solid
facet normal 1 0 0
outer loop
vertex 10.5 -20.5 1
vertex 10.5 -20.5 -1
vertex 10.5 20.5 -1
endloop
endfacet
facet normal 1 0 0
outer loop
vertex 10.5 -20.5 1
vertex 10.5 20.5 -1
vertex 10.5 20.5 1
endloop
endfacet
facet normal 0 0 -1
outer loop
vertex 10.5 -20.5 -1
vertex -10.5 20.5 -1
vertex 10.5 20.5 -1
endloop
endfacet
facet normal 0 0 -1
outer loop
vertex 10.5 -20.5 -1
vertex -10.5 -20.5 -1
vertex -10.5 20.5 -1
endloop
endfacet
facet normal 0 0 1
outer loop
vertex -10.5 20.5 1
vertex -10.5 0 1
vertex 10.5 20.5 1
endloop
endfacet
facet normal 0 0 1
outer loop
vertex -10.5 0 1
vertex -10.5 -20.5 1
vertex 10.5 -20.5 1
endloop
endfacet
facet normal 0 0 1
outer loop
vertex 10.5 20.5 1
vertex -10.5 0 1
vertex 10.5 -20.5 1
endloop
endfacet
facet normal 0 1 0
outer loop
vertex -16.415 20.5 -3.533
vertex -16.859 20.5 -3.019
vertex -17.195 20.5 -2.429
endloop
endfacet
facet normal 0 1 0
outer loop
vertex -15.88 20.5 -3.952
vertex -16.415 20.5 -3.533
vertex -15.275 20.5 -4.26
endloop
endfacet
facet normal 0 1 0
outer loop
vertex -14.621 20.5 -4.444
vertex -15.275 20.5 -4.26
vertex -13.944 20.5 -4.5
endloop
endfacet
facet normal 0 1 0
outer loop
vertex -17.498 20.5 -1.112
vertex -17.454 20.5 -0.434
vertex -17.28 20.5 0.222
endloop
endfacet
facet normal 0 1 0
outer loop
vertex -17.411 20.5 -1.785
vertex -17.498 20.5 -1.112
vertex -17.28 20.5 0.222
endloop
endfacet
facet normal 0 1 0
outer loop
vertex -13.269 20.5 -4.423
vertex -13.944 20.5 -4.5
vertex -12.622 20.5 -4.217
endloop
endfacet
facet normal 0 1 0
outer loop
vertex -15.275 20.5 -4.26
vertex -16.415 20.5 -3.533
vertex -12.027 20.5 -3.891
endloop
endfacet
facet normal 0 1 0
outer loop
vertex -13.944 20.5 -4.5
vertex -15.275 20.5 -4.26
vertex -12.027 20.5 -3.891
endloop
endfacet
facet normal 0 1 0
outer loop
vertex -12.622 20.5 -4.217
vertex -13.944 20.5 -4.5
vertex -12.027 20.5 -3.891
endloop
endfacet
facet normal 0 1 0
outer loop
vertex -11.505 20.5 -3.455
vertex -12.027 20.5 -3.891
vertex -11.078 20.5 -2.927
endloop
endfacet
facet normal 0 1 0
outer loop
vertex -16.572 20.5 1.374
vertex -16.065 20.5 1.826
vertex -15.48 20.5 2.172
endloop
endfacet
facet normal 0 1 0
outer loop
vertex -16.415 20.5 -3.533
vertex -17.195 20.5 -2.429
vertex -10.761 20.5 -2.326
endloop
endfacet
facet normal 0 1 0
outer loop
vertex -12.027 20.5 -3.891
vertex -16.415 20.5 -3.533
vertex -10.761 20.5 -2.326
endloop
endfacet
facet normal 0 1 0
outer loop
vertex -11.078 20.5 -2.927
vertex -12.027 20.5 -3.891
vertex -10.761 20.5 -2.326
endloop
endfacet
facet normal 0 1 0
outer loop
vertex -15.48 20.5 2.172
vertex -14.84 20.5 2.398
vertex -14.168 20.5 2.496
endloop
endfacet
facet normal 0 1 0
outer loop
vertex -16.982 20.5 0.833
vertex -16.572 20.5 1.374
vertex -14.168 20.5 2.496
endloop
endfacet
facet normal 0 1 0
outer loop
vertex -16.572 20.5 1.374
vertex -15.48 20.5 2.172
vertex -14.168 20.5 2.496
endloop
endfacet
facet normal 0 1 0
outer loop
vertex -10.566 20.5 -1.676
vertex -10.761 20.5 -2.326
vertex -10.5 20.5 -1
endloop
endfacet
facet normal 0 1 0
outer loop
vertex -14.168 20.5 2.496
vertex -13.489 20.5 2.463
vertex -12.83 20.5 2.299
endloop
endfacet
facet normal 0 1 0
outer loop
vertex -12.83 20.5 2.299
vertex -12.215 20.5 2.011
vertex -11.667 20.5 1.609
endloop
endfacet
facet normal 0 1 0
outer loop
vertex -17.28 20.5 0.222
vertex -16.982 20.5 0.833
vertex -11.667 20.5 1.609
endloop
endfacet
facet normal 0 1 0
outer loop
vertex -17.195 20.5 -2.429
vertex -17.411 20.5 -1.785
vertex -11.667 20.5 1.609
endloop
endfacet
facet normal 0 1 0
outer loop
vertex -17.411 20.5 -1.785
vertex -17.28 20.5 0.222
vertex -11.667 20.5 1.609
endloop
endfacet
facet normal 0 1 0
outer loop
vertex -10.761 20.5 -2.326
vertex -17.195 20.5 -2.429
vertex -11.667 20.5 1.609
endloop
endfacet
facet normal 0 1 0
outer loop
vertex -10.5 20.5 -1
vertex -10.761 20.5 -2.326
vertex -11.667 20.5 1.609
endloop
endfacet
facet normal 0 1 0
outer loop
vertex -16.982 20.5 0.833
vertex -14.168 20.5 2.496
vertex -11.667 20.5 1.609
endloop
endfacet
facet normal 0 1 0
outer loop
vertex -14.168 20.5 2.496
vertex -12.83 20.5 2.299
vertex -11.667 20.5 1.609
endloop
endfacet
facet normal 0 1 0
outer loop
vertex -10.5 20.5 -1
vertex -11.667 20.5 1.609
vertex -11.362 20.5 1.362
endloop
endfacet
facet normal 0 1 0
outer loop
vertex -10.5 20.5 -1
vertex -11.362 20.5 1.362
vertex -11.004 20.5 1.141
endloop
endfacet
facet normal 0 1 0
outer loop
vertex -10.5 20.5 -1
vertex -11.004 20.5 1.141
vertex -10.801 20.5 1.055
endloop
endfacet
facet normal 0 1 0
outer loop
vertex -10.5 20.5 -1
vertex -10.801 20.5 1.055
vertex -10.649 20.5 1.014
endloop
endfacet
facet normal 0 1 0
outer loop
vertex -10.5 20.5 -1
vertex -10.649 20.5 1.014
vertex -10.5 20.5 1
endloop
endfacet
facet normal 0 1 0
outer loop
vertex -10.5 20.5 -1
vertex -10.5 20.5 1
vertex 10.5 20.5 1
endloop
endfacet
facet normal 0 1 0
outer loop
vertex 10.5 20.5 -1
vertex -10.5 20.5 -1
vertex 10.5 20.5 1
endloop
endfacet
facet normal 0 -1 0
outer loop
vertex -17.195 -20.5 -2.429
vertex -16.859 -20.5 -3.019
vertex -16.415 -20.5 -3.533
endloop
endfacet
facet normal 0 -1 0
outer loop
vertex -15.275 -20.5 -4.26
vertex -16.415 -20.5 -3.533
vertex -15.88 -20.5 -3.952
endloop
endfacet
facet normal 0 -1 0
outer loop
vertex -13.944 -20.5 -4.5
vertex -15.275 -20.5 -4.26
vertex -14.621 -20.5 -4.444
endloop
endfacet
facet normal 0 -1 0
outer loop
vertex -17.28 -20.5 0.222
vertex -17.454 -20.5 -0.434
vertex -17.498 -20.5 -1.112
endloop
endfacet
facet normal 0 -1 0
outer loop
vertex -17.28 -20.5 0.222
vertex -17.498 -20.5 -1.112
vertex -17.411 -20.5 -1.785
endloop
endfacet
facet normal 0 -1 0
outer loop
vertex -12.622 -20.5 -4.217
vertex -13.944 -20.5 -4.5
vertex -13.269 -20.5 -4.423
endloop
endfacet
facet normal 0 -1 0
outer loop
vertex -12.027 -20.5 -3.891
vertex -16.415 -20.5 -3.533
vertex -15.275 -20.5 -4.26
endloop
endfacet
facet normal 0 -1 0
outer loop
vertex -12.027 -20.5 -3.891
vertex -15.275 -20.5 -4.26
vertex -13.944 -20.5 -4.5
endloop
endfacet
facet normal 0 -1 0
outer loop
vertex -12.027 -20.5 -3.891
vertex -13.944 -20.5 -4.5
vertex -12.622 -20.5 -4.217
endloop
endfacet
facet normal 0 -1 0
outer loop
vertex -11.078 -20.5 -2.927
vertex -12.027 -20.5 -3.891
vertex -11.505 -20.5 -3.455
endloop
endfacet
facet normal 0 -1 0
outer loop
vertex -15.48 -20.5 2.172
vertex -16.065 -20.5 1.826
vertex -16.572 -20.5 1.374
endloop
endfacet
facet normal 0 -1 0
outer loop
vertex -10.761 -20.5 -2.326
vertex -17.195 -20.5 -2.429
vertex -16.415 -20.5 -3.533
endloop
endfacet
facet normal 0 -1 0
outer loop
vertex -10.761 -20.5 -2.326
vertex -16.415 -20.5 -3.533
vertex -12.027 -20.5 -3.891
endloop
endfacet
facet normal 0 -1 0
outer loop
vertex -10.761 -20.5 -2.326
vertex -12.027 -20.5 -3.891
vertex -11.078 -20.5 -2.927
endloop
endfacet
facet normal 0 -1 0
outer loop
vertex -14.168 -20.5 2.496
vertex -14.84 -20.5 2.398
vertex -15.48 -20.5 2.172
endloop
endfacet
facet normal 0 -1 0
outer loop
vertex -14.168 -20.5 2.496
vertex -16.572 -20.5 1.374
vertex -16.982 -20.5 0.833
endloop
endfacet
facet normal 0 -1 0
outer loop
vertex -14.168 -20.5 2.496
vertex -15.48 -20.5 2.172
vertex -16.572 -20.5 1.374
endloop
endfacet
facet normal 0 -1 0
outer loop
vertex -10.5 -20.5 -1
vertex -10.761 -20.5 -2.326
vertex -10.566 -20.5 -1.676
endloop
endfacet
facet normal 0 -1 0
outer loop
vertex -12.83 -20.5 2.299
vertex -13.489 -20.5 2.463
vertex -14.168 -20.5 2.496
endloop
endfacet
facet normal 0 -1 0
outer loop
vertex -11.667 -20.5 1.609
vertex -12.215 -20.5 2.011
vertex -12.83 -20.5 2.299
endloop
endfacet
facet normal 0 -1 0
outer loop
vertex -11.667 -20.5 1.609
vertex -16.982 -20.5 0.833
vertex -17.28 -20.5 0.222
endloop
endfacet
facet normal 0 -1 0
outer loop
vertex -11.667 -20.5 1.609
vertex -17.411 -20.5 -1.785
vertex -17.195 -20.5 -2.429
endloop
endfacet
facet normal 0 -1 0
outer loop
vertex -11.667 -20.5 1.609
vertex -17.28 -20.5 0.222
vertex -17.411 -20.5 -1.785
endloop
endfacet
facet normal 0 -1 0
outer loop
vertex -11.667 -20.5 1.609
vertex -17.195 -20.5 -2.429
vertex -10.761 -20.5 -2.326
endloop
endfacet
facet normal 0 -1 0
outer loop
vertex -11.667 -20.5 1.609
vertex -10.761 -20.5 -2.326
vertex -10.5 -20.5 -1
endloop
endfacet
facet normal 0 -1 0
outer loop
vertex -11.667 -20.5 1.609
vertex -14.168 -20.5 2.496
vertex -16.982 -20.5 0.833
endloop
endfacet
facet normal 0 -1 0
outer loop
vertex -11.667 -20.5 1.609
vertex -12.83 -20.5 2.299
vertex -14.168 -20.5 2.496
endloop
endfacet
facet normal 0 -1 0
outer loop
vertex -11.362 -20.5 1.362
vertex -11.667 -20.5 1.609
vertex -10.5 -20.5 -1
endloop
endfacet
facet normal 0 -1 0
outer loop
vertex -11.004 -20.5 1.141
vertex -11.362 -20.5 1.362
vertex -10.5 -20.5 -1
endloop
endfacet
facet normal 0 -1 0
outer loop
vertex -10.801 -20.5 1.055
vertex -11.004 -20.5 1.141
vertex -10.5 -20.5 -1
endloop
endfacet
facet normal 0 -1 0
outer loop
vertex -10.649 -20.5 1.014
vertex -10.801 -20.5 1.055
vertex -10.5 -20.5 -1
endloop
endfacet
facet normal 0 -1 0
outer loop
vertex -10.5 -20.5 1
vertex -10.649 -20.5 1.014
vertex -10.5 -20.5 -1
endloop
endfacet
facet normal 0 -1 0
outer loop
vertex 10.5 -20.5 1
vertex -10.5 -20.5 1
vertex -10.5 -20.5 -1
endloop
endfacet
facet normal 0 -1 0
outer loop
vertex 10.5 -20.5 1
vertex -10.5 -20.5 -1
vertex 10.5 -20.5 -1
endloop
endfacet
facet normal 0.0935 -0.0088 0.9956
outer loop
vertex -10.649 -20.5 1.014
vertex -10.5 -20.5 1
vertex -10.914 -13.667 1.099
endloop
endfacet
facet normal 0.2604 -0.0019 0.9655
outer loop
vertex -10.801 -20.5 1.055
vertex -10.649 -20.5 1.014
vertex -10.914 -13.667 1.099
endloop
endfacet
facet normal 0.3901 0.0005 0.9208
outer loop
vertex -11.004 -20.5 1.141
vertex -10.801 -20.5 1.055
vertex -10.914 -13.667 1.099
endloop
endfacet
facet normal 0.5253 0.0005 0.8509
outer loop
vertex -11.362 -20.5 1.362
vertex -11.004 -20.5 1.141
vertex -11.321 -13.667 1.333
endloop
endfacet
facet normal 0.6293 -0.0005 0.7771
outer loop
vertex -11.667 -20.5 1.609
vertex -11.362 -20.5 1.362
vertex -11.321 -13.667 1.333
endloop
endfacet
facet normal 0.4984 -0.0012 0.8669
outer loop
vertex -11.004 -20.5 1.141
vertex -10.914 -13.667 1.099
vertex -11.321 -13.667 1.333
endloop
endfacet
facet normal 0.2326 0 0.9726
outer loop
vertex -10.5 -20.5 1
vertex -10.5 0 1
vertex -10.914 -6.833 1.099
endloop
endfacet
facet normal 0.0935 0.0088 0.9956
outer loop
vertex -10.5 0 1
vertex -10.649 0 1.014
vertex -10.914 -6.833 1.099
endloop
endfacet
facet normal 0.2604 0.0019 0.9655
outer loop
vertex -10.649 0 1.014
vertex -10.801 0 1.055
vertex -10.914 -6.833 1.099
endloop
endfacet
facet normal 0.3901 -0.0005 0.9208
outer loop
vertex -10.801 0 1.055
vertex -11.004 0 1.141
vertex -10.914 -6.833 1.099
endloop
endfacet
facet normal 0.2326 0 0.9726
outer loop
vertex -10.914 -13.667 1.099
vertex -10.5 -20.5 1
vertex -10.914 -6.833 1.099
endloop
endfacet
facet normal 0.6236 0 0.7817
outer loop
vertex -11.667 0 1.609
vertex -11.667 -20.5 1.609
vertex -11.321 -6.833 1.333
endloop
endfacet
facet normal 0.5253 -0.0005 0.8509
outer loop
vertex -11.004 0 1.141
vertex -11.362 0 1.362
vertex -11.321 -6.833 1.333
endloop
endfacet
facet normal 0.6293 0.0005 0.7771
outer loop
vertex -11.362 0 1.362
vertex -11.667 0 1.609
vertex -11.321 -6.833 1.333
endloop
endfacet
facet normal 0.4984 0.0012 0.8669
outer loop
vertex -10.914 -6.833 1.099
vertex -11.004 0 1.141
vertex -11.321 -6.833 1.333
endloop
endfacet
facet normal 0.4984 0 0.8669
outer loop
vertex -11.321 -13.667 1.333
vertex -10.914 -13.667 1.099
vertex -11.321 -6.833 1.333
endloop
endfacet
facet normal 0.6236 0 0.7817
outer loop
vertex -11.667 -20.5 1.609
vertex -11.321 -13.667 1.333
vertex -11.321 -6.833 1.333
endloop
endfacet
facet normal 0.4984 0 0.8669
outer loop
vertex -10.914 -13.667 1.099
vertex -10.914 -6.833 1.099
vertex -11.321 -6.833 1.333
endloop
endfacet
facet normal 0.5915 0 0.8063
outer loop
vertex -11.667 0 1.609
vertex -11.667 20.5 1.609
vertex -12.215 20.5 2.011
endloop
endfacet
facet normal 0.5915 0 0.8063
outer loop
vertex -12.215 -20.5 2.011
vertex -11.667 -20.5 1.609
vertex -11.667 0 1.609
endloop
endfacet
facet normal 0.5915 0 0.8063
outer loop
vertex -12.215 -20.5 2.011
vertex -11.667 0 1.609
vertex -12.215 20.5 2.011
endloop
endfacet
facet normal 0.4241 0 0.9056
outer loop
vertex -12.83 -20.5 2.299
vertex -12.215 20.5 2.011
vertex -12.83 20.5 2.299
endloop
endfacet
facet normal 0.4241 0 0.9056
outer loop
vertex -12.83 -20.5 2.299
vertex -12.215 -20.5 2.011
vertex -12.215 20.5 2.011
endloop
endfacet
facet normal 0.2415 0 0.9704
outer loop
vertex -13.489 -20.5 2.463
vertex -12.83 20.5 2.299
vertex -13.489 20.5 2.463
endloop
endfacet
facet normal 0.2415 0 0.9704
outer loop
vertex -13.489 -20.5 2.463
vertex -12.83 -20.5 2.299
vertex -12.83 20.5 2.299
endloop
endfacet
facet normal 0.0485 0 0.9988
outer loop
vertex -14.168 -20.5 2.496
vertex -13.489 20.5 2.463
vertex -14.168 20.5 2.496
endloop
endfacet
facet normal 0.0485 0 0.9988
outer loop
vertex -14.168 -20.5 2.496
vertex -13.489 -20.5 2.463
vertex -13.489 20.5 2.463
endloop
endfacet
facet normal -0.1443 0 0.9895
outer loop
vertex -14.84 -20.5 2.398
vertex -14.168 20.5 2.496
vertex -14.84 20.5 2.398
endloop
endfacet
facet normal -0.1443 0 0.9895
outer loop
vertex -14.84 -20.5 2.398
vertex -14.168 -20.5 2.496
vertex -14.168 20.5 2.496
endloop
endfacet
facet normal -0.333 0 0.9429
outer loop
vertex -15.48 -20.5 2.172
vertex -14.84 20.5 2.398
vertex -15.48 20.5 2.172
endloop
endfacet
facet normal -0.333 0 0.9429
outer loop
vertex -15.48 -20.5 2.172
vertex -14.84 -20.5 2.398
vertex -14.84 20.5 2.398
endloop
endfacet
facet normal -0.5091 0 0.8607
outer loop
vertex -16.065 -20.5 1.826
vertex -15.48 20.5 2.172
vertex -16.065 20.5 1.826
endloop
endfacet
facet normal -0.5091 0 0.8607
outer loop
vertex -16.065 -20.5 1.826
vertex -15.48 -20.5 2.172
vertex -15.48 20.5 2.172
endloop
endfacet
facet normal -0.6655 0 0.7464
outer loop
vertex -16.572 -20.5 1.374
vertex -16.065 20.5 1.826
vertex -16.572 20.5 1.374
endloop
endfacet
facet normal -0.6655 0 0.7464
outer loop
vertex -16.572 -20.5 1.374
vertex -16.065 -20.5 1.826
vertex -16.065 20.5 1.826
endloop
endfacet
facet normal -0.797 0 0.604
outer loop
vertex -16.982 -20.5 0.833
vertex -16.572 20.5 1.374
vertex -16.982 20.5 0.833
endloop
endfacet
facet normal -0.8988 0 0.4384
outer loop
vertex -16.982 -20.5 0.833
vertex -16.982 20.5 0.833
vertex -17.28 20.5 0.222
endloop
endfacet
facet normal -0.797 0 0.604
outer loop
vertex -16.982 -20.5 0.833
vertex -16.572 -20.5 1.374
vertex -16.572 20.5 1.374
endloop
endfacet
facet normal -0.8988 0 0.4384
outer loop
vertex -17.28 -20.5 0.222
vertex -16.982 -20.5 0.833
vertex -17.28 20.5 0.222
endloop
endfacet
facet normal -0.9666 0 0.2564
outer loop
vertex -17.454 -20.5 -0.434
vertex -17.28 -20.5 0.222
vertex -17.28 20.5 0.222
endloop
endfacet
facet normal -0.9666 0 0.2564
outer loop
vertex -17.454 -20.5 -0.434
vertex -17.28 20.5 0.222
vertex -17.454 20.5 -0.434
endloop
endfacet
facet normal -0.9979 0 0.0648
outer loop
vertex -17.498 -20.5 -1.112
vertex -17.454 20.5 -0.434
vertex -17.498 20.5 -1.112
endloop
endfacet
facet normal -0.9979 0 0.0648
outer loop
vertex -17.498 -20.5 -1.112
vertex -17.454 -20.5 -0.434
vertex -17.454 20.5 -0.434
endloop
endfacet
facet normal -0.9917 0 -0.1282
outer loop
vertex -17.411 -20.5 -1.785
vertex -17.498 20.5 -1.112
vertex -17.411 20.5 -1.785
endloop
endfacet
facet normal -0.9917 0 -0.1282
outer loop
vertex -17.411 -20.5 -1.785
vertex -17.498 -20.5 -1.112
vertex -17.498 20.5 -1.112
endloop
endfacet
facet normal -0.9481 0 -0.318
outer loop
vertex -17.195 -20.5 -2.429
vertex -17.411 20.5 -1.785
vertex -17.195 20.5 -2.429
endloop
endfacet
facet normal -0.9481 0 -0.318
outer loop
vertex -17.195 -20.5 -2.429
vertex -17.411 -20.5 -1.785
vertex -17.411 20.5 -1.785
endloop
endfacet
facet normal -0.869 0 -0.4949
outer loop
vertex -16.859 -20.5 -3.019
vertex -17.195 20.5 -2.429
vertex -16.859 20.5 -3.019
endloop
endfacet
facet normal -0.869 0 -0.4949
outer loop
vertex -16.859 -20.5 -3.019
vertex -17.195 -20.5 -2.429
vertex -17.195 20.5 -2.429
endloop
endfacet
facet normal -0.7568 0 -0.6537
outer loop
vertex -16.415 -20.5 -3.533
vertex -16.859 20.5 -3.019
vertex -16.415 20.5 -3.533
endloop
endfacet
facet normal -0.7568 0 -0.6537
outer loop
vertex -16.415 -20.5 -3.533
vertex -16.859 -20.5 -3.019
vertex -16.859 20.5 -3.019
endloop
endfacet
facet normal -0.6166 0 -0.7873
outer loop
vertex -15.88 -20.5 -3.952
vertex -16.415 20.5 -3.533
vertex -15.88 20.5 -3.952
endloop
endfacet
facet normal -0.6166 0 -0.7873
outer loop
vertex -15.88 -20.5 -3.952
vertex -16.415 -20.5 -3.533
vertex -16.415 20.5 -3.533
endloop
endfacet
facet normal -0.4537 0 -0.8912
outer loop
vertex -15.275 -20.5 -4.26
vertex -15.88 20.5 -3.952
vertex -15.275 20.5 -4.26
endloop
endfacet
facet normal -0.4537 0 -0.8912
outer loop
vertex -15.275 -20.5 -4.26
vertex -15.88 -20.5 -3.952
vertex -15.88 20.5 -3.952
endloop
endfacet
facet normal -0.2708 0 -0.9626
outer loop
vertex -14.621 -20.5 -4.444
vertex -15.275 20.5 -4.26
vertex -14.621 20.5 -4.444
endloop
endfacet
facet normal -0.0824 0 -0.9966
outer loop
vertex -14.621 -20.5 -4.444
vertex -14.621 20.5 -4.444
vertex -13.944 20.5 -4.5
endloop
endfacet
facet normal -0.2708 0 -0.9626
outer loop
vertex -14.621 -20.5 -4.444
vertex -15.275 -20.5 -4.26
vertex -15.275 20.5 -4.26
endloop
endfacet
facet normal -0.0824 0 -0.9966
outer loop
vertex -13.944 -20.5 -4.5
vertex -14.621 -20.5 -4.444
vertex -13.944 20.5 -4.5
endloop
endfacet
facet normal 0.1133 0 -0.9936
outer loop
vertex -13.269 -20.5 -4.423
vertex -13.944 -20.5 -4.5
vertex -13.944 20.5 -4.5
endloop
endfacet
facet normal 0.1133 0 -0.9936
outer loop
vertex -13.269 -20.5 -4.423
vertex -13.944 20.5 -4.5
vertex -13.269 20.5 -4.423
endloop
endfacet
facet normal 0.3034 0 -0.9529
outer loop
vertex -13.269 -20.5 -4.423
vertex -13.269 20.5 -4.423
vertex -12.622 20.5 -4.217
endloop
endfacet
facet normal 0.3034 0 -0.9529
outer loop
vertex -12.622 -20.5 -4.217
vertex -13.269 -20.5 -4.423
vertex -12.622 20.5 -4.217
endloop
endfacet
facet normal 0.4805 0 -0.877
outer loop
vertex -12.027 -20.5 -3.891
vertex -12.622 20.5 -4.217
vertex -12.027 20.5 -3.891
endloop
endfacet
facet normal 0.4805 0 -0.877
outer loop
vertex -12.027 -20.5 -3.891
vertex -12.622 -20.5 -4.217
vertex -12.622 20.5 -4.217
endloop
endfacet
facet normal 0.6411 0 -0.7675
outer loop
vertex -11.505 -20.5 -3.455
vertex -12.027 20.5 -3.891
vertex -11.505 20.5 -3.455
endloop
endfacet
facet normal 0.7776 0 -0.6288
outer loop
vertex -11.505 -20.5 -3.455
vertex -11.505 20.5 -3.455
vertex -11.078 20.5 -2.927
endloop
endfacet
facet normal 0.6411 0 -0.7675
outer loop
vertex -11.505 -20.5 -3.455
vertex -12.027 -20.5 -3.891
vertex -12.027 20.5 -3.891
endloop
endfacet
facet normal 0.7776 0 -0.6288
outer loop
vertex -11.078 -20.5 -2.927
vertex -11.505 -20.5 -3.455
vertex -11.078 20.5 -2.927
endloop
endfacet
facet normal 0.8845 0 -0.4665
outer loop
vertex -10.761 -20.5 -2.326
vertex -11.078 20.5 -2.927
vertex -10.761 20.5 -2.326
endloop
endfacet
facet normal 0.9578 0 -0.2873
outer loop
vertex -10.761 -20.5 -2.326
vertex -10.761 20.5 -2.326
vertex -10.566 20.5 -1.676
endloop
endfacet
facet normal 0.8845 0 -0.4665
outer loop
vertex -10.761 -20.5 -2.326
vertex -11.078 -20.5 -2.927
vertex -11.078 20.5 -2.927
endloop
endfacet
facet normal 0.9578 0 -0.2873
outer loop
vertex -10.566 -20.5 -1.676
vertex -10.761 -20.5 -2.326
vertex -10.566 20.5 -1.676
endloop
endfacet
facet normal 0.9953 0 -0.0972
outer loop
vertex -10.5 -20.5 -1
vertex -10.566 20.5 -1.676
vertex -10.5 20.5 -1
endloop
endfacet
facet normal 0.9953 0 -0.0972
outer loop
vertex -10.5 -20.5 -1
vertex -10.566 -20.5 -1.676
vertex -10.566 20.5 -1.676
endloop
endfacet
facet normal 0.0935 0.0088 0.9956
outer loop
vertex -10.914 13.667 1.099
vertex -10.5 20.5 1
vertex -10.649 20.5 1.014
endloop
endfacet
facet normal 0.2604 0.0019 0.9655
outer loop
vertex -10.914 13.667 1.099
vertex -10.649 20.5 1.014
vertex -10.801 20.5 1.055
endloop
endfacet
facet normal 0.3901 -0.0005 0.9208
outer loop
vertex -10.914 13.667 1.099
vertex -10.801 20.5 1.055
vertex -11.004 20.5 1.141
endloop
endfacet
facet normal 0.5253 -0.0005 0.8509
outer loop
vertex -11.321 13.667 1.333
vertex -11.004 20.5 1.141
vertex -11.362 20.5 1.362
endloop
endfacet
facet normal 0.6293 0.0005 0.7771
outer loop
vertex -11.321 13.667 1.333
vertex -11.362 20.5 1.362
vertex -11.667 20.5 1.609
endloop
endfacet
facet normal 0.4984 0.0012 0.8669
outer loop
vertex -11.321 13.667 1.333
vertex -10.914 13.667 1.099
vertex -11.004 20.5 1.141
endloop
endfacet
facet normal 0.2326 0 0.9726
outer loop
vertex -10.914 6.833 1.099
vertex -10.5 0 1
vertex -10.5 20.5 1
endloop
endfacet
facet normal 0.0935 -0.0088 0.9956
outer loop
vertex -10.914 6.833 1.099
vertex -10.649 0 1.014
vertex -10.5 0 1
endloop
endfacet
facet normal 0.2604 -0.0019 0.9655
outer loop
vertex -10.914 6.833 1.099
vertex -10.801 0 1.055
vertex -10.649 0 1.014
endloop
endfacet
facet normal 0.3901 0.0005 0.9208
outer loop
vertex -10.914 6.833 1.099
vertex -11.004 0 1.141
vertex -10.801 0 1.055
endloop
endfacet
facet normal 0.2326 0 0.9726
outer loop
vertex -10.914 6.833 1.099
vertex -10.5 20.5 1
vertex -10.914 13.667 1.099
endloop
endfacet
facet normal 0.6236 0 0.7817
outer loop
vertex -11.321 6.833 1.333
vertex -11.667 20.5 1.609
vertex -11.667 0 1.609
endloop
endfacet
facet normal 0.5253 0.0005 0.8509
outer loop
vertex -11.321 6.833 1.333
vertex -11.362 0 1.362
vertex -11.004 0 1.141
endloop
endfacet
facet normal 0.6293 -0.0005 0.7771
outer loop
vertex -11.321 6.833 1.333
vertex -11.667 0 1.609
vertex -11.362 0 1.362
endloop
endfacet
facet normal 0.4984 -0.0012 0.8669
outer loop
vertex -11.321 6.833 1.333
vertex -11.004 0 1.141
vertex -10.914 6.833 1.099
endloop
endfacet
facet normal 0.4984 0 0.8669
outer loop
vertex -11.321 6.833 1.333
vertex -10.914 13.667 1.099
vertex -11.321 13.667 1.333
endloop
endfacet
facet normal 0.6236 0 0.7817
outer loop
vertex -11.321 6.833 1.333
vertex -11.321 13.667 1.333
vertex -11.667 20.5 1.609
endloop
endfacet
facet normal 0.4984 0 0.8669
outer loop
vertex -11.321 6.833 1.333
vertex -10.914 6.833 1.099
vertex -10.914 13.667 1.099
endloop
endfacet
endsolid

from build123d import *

# Parameters (mm, degrees)
F0_W     = 21
F0_H     = 2
F1_DEPTH = 20.5


with BuildPart() as f1:
    # F0 (on Front) → F1 (new body, symmetric)
    with BuildSketch(Plane.XZ):
        Rectangle(F0_W, F0_H)
        with BuildLine():
            ThreePointArc((-11.667242, 1.609261), (-10.805109, 0.429222), (-10.5, -1))
            Line((-10.5, -1), (-10.5, 1))
            add(Edge.make_bspline(
                [(-10.5, 1), (-10.900594, 1), (-11.368599, 1.342264), (-11.667242, 1.609261)],
                knots=[0, 0, 0, 0, 1.316683, 1.316683, 1.316683, 1.316683], degree=3))
        make_face()
        with BuildLine():
            ThreePointArc((-11.667242, 1.609261), (-17.194891, -2.429222), (-10.5, -1))
            ThreePointArc((-10.5, -1), (-10.805109, 0.429222), (-11.667242, 1.609261))
        make_face()
    extrude(amount=F1_DEPTH, both=True)


solid = f1.part
